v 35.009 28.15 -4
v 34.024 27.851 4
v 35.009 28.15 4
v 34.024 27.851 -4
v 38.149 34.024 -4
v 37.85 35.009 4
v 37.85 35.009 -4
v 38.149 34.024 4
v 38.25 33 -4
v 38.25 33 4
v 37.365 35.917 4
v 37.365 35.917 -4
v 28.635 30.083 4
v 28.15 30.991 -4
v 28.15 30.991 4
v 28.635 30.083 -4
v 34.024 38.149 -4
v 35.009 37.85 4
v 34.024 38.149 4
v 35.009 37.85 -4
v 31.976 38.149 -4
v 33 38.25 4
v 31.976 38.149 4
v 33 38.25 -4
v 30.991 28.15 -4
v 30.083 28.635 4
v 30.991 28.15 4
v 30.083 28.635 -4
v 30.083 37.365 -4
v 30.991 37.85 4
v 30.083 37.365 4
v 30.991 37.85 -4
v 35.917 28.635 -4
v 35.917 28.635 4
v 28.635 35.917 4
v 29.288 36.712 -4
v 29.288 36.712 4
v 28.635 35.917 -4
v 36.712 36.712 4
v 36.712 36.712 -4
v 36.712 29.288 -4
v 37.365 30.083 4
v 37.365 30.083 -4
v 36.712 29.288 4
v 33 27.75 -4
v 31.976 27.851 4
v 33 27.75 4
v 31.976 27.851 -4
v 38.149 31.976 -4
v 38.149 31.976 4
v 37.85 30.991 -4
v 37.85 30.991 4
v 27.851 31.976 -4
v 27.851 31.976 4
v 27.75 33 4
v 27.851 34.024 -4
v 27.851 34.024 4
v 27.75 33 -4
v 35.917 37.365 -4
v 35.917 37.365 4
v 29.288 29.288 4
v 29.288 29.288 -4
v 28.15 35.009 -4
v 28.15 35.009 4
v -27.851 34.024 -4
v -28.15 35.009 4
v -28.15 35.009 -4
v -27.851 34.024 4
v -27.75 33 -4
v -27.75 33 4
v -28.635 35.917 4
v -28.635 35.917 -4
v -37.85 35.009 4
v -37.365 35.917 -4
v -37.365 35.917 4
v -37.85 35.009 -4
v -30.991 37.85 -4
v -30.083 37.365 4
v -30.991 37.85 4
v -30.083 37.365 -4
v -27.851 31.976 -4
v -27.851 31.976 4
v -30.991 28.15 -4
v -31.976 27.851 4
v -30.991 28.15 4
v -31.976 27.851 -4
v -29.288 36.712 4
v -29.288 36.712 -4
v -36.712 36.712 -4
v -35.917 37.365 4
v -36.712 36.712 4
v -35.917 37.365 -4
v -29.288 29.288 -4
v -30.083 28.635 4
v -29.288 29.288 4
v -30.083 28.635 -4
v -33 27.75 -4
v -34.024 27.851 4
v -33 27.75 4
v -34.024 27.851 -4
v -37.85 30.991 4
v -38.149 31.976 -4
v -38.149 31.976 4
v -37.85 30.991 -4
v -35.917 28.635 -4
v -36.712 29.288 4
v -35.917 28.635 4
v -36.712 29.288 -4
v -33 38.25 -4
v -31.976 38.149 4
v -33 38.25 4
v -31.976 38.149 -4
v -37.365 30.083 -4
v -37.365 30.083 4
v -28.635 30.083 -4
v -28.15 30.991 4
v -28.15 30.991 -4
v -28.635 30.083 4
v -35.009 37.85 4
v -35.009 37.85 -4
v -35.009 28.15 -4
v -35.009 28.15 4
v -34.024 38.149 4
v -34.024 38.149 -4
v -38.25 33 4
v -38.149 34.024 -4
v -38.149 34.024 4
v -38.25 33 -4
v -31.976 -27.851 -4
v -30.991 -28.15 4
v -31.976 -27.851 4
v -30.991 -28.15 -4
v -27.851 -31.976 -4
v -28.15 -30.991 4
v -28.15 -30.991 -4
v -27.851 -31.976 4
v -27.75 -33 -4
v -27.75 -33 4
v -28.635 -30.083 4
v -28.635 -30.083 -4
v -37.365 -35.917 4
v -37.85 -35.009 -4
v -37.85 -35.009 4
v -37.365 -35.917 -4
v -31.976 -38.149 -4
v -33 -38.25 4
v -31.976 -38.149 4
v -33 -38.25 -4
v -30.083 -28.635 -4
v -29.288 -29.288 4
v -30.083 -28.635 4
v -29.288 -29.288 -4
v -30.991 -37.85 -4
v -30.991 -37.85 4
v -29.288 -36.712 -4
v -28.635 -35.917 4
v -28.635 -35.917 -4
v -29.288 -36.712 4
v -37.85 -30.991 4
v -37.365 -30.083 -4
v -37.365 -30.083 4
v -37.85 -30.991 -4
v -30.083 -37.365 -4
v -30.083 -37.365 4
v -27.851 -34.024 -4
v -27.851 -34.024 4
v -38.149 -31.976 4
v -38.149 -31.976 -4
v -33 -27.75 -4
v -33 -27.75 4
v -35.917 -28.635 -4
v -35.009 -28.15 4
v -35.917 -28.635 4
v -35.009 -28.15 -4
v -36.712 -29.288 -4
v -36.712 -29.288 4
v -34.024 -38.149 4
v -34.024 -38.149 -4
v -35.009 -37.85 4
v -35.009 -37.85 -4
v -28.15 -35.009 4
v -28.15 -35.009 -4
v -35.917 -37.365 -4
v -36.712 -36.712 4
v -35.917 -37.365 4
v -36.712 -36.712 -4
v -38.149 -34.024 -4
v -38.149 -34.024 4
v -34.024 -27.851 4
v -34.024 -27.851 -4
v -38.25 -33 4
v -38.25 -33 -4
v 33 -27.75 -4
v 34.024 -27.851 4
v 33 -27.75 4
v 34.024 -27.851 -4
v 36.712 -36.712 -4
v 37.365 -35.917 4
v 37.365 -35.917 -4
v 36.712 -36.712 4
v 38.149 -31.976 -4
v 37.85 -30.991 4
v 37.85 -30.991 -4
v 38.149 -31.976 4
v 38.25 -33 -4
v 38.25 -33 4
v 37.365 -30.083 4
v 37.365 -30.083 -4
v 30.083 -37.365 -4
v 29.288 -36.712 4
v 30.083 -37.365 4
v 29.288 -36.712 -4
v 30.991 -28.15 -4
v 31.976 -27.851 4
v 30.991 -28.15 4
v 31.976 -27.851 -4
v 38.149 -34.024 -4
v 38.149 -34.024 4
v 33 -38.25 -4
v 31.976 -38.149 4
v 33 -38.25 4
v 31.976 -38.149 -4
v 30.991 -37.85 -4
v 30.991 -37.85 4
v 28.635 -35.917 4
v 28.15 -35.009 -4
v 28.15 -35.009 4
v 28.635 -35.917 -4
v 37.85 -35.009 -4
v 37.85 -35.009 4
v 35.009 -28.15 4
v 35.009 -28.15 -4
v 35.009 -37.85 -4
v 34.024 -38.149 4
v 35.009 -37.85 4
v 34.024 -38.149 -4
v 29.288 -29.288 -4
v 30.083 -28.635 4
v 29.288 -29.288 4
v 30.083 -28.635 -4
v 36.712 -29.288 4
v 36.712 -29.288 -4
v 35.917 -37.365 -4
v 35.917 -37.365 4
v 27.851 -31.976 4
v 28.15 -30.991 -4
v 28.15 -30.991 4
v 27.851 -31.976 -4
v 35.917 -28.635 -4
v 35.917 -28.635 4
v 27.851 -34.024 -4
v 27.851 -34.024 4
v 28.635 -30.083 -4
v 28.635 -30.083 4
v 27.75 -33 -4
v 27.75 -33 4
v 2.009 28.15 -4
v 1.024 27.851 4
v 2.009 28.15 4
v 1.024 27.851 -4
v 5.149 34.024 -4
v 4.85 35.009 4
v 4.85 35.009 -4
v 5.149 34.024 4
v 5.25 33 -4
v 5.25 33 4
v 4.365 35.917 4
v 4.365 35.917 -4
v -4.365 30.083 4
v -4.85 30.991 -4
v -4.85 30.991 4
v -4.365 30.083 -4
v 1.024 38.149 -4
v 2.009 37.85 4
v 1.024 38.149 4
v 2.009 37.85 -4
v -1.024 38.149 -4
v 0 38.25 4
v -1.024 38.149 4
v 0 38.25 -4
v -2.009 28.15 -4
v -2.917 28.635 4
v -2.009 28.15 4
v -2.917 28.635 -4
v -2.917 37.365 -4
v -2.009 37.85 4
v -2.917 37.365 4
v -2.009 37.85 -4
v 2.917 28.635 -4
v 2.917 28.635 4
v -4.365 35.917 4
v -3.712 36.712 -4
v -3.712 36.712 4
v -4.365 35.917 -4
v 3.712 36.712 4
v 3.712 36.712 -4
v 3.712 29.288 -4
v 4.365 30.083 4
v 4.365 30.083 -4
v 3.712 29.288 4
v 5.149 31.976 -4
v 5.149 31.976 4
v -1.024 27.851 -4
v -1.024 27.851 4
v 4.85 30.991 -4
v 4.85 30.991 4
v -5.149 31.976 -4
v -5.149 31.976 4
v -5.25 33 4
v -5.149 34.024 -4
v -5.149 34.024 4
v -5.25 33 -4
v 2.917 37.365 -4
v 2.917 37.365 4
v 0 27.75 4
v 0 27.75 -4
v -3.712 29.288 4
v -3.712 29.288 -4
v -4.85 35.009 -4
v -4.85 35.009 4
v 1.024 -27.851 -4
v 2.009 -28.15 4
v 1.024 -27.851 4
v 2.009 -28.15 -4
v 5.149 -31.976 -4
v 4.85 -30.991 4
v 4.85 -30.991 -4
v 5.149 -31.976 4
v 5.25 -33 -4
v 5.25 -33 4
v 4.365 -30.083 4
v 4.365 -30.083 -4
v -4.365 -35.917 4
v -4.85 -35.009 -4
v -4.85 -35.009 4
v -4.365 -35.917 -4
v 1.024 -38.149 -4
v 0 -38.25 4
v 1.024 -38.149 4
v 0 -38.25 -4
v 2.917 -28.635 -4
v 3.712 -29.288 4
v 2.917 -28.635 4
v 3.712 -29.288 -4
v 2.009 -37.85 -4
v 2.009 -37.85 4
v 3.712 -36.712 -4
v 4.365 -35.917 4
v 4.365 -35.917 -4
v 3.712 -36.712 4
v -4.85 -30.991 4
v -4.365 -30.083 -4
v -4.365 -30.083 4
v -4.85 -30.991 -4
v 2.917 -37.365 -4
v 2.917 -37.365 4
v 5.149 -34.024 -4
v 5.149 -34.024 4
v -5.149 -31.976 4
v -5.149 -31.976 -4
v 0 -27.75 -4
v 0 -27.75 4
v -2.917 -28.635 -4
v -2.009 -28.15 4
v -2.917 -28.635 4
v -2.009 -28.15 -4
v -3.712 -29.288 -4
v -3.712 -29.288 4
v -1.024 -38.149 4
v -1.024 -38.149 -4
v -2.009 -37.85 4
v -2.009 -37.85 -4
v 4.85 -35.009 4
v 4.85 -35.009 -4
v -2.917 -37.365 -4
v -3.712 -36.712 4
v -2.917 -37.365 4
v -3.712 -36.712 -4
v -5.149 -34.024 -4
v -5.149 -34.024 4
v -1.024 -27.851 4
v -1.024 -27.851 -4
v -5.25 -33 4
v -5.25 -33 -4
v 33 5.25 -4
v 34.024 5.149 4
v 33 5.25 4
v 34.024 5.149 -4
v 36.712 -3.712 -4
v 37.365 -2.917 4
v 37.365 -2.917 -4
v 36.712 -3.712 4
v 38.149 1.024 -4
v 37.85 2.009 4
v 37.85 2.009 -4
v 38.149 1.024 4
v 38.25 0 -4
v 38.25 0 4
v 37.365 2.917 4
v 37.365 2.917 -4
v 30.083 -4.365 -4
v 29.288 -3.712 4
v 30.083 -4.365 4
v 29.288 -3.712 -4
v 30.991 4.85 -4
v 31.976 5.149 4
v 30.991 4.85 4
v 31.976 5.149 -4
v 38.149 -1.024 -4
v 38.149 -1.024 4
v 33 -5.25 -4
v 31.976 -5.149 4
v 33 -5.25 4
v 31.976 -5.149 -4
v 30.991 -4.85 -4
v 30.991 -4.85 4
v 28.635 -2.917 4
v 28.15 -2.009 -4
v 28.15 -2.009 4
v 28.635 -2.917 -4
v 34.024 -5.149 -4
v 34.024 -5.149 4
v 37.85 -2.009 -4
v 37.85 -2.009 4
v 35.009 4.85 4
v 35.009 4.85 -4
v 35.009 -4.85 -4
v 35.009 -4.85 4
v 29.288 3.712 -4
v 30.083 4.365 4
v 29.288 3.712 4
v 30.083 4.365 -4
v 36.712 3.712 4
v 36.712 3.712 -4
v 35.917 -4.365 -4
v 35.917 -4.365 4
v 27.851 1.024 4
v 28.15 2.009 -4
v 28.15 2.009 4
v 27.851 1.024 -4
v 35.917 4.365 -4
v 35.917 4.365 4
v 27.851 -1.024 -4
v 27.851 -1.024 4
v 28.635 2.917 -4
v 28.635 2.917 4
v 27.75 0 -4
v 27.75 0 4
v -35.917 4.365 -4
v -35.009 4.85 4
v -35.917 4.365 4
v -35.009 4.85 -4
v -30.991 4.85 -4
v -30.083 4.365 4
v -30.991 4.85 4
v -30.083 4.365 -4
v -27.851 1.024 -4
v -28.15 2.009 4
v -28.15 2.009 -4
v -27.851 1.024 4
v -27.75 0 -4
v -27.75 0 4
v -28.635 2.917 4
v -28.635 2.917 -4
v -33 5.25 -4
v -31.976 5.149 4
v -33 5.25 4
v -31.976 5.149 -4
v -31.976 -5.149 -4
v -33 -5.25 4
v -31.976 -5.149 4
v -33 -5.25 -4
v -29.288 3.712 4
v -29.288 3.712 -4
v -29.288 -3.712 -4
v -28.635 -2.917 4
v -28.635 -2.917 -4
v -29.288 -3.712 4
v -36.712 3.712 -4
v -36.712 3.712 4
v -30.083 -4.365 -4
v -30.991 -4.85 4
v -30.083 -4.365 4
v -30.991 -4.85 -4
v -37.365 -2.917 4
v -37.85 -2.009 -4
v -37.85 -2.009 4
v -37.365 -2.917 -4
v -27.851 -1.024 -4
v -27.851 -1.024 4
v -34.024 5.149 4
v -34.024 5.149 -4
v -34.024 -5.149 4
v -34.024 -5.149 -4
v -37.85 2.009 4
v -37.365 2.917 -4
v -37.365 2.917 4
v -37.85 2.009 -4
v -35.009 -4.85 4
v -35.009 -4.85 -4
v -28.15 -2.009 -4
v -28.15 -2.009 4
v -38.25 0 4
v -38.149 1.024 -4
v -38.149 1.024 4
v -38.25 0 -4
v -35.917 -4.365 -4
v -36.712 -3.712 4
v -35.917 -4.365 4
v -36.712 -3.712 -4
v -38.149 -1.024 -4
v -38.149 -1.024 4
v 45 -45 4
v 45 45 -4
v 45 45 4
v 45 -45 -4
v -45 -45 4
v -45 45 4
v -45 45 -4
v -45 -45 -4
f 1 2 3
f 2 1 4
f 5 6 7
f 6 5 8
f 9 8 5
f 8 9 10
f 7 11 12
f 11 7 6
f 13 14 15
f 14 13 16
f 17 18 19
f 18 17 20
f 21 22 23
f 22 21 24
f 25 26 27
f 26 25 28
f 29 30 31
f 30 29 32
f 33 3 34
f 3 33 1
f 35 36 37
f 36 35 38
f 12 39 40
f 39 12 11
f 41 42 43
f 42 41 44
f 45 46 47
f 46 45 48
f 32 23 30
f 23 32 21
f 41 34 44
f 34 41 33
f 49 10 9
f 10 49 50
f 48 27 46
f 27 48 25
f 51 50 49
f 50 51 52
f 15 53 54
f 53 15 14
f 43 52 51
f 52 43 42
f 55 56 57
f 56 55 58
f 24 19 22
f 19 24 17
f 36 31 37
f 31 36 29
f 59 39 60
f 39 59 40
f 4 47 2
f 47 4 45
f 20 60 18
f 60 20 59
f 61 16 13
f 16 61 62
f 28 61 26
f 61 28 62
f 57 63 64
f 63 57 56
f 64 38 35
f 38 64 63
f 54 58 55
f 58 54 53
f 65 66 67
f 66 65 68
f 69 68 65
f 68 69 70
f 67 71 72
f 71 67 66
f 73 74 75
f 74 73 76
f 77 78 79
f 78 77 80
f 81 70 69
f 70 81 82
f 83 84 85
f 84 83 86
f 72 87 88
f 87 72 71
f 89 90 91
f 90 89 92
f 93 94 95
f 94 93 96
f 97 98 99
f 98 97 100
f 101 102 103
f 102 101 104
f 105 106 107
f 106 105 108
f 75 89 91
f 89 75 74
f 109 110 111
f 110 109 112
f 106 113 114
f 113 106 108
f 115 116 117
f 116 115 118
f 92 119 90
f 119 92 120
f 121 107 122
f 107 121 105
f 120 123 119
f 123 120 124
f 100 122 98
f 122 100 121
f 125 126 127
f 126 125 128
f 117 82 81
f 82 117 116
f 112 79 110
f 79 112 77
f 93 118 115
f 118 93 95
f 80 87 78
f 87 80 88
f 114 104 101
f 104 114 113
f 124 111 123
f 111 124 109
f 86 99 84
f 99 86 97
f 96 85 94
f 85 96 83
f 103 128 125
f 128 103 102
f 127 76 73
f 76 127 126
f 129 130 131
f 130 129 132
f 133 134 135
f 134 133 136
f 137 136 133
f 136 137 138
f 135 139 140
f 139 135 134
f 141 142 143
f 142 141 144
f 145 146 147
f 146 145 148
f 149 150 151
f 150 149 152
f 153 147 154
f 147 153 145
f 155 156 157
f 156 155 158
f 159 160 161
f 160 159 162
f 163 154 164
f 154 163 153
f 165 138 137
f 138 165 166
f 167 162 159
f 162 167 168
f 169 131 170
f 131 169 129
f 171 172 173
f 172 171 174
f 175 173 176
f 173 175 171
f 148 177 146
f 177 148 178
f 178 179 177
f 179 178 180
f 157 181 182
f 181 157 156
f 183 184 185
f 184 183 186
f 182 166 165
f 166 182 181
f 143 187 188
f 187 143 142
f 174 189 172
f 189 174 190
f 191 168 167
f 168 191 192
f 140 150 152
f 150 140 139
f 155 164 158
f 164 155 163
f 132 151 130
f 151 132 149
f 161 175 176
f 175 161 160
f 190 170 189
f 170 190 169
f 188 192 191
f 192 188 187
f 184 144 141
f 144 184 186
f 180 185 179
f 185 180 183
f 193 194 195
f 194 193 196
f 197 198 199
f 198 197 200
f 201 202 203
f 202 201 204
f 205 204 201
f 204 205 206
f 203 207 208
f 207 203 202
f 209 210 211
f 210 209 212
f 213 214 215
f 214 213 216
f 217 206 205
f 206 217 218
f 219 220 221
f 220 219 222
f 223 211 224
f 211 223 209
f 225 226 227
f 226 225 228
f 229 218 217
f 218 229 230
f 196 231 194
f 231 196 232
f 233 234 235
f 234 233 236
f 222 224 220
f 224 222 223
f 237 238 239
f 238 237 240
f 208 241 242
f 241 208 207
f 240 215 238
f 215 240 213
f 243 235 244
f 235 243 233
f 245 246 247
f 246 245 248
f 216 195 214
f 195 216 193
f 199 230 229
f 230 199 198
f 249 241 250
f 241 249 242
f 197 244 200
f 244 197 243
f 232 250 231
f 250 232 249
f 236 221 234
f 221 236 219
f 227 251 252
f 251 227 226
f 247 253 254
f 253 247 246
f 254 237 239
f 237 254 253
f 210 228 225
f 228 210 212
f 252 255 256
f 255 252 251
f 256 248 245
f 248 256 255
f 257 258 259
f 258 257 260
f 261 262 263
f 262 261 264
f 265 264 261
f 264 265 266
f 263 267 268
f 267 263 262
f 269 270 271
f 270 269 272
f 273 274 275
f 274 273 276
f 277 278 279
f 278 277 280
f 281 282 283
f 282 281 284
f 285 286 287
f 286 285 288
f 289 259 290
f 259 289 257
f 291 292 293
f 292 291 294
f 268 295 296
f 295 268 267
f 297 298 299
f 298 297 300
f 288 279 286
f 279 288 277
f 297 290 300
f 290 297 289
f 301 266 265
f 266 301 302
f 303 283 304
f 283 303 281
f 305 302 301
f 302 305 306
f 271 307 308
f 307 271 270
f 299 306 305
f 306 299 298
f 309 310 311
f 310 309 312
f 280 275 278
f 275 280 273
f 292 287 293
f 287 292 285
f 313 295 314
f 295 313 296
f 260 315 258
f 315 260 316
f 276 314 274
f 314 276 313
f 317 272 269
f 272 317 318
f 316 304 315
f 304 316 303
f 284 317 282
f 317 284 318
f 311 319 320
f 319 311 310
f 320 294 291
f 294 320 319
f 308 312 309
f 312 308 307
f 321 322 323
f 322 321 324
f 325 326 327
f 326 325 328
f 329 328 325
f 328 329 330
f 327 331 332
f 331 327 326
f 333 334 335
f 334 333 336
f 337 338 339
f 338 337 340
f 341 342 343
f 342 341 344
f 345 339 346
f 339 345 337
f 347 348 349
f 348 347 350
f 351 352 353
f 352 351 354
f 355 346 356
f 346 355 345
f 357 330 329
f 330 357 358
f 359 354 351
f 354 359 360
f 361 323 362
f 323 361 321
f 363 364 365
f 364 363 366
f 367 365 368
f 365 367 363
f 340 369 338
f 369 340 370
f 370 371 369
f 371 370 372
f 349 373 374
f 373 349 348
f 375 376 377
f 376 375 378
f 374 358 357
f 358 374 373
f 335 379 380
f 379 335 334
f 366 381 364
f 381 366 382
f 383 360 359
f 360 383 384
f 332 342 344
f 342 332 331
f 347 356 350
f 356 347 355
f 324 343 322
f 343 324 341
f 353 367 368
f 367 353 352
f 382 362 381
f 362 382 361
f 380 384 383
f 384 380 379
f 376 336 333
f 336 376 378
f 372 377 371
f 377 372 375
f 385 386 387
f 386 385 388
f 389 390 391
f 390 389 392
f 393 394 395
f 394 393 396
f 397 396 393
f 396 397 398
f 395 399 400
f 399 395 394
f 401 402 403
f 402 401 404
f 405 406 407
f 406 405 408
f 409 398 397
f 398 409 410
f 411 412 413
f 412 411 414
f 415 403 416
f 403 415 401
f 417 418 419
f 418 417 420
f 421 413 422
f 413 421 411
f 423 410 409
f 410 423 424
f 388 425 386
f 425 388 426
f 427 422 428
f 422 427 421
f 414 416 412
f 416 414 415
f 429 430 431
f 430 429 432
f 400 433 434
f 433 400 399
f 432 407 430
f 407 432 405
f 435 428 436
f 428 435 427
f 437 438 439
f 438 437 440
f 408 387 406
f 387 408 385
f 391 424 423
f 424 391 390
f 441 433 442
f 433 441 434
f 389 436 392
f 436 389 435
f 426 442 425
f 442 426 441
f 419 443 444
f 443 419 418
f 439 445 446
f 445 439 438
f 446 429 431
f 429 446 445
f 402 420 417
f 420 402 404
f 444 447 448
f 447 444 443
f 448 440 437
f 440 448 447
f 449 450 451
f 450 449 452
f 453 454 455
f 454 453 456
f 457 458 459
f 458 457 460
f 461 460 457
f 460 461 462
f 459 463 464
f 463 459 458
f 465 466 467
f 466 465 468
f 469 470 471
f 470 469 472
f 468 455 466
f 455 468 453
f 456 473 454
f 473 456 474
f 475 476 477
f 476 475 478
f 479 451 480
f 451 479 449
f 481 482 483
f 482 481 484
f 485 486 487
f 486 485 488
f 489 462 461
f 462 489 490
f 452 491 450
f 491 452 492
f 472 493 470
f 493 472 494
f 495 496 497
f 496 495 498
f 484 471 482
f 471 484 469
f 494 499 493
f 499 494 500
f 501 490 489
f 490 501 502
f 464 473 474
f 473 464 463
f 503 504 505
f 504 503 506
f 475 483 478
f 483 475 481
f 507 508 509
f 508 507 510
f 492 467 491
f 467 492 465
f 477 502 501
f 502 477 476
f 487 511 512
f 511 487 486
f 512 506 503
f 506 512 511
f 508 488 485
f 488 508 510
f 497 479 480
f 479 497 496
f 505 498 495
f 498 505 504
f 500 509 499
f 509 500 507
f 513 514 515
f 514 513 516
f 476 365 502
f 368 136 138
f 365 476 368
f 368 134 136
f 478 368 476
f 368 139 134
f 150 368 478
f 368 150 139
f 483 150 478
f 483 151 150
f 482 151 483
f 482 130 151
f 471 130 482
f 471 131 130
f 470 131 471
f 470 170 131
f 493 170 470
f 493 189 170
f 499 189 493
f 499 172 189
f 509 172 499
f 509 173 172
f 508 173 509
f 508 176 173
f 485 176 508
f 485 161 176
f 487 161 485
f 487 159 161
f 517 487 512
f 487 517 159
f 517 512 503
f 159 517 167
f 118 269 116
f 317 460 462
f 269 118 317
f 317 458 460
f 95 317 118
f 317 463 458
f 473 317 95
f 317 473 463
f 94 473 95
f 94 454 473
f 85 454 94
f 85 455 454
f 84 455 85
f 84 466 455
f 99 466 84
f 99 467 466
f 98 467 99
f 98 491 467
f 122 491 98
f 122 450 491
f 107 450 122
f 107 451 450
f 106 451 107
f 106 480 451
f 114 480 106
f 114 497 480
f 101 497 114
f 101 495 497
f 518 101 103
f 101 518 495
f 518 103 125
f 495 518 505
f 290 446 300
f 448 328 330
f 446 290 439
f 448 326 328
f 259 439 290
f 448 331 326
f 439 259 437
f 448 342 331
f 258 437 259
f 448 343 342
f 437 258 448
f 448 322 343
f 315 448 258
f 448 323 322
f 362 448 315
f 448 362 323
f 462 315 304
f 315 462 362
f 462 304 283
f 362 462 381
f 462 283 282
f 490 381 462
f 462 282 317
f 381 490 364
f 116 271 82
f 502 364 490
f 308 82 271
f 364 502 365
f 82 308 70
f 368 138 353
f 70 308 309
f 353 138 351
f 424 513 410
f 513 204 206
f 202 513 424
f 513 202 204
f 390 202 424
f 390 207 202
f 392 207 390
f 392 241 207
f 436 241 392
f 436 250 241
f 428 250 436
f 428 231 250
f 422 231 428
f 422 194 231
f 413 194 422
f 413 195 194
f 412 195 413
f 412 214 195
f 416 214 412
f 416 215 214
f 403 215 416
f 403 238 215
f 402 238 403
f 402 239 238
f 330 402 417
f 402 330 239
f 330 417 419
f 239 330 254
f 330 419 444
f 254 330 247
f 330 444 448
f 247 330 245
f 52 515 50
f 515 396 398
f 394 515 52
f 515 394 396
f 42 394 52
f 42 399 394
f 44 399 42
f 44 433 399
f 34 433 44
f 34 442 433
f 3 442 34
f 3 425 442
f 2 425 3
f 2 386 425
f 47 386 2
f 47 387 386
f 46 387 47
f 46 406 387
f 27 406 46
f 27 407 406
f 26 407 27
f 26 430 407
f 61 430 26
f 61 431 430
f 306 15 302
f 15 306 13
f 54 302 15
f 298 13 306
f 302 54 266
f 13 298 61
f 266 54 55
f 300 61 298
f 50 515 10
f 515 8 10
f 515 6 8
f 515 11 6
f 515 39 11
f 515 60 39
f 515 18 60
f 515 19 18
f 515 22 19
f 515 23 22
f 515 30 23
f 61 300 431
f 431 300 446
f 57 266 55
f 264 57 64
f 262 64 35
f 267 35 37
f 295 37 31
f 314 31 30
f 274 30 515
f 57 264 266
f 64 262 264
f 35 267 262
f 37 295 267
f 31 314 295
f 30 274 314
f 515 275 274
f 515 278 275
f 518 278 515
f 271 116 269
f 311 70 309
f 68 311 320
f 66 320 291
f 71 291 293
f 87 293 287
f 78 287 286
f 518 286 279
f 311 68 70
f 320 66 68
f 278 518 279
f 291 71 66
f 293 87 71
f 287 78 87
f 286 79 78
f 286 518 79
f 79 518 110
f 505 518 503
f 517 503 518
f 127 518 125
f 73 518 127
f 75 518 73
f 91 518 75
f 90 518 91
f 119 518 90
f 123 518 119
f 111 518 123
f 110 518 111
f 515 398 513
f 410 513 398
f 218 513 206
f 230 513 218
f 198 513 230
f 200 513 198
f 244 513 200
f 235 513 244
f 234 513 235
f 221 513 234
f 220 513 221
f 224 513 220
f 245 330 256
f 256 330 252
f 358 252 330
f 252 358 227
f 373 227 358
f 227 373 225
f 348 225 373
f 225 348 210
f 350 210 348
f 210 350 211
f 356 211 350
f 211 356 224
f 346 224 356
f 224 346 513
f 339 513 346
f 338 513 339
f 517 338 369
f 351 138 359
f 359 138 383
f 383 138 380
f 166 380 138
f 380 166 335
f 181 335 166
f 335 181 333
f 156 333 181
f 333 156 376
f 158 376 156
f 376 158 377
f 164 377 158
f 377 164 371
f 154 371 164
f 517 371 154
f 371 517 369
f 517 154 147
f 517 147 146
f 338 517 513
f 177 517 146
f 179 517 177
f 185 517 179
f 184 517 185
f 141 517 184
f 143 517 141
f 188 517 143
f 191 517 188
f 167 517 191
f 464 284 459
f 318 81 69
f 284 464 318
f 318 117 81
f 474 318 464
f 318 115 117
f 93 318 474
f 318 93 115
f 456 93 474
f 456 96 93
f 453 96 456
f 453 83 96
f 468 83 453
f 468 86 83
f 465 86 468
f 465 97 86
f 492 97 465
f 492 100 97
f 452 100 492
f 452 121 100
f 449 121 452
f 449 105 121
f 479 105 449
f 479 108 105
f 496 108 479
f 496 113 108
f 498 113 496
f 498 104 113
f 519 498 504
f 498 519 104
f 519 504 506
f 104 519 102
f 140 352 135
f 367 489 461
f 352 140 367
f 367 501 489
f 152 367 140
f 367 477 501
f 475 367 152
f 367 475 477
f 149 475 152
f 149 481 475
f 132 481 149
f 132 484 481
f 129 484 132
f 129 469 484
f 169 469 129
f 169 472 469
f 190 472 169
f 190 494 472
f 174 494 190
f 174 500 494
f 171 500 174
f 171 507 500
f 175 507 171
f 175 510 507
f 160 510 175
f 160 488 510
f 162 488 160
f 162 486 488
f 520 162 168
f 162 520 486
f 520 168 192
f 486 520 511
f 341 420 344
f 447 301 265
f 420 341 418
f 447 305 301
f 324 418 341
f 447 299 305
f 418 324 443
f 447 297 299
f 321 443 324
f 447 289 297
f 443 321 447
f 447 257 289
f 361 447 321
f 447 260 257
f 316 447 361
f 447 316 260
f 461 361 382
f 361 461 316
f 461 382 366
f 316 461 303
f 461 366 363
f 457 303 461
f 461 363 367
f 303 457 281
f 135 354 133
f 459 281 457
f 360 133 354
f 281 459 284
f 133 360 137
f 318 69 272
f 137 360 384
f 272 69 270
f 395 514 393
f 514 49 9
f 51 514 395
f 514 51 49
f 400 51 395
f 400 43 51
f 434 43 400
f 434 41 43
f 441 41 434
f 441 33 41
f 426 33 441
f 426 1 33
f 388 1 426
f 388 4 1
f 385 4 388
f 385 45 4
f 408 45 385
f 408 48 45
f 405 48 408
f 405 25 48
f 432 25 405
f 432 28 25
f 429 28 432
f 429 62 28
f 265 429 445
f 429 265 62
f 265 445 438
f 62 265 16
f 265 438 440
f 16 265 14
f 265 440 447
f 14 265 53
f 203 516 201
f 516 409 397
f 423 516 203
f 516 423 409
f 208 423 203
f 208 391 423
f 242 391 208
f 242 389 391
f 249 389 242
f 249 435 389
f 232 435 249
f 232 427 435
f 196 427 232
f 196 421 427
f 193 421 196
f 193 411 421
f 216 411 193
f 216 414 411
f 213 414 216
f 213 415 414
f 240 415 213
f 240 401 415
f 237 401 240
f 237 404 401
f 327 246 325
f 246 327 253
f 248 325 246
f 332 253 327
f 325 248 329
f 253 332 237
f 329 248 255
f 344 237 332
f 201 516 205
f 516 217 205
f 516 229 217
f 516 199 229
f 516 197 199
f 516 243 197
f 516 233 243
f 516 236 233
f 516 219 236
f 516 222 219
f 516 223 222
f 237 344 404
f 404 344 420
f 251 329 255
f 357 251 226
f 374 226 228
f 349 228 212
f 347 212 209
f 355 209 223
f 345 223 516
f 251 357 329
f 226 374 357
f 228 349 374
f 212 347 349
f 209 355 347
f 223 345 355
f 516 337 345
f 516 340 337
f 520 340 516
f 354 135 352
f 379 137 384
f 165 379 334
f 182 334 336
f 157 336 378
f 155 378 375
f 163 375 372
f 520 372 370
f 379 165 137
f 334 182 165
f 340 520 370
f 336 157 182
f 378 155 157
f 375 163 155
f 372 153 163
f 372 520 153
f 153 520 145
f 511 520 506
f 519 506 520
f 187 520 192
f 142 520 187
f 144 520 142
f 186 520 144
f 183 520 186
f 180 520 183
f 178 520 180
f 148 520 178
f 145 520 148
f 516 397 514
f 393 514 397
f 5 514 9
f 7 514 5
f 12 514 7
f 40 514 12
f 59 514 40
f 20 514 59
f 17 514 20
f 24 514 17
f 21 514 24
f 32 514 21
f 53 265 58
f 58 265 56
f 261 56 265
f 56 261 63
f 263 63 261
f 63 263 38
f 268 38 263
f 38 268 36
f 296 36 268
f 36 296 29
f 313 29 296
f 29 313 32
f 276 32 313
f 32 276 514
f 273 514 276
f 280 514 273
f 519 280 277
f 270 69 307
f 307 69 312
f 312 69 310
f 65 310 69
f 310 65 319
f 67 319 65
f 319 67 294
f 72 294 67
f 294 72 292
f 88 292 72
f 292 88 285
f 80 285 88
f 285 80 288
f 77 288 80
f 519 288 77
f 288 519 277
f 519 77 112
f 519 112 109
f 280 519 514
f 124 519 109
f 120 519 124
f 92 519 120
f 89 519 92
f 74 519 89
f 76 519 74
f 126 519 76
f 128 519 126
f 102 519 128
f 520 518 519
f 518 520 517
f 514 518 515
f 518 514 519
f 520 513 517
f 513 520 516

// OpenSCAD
$fn = 32;

// ----------------------------------------------------------------------
// Corner plate 90 x 90 x 8
// 8 holes, centres taken from the edge offset
// ----------------------------------------------------------------------

// --- parameters (mm) ---
plate = [90, 90, 8];  // overall size (x, y, z)
holes = 8;            // number of holes the drawing asks for
hole_d = 10.5;        // hole diameter
edge = 12;            // hole centre offset from the plate edge

// --- derived feature positions (mm) ---
corner_x = plate[0] / 2 - edge;  // = 33   corner hole X
corner_y = plate[1] / 2 - edge;  // = 33   corner hole Y
feature_centers = [
  [corner_x, corner_y],
  [-corner_x, corner_y],
  [-corner_x, -corner_y],
  [corner_x, -corner_y],
  [0, corner_y],
  [0, -corner_y],
  [corner_x, 0],
  [-corner_x, 0]
];   // hole centres the loop below drills

// plate outline, every hole drilled through with the same cutters
difference() {
  cube(plate, center = true);
  for (centre = feature_centers)
    translate([centre[0], centre[1], 0])
      cylinder(d = hole_d, h = plate[2] + 2, center = true);
}
